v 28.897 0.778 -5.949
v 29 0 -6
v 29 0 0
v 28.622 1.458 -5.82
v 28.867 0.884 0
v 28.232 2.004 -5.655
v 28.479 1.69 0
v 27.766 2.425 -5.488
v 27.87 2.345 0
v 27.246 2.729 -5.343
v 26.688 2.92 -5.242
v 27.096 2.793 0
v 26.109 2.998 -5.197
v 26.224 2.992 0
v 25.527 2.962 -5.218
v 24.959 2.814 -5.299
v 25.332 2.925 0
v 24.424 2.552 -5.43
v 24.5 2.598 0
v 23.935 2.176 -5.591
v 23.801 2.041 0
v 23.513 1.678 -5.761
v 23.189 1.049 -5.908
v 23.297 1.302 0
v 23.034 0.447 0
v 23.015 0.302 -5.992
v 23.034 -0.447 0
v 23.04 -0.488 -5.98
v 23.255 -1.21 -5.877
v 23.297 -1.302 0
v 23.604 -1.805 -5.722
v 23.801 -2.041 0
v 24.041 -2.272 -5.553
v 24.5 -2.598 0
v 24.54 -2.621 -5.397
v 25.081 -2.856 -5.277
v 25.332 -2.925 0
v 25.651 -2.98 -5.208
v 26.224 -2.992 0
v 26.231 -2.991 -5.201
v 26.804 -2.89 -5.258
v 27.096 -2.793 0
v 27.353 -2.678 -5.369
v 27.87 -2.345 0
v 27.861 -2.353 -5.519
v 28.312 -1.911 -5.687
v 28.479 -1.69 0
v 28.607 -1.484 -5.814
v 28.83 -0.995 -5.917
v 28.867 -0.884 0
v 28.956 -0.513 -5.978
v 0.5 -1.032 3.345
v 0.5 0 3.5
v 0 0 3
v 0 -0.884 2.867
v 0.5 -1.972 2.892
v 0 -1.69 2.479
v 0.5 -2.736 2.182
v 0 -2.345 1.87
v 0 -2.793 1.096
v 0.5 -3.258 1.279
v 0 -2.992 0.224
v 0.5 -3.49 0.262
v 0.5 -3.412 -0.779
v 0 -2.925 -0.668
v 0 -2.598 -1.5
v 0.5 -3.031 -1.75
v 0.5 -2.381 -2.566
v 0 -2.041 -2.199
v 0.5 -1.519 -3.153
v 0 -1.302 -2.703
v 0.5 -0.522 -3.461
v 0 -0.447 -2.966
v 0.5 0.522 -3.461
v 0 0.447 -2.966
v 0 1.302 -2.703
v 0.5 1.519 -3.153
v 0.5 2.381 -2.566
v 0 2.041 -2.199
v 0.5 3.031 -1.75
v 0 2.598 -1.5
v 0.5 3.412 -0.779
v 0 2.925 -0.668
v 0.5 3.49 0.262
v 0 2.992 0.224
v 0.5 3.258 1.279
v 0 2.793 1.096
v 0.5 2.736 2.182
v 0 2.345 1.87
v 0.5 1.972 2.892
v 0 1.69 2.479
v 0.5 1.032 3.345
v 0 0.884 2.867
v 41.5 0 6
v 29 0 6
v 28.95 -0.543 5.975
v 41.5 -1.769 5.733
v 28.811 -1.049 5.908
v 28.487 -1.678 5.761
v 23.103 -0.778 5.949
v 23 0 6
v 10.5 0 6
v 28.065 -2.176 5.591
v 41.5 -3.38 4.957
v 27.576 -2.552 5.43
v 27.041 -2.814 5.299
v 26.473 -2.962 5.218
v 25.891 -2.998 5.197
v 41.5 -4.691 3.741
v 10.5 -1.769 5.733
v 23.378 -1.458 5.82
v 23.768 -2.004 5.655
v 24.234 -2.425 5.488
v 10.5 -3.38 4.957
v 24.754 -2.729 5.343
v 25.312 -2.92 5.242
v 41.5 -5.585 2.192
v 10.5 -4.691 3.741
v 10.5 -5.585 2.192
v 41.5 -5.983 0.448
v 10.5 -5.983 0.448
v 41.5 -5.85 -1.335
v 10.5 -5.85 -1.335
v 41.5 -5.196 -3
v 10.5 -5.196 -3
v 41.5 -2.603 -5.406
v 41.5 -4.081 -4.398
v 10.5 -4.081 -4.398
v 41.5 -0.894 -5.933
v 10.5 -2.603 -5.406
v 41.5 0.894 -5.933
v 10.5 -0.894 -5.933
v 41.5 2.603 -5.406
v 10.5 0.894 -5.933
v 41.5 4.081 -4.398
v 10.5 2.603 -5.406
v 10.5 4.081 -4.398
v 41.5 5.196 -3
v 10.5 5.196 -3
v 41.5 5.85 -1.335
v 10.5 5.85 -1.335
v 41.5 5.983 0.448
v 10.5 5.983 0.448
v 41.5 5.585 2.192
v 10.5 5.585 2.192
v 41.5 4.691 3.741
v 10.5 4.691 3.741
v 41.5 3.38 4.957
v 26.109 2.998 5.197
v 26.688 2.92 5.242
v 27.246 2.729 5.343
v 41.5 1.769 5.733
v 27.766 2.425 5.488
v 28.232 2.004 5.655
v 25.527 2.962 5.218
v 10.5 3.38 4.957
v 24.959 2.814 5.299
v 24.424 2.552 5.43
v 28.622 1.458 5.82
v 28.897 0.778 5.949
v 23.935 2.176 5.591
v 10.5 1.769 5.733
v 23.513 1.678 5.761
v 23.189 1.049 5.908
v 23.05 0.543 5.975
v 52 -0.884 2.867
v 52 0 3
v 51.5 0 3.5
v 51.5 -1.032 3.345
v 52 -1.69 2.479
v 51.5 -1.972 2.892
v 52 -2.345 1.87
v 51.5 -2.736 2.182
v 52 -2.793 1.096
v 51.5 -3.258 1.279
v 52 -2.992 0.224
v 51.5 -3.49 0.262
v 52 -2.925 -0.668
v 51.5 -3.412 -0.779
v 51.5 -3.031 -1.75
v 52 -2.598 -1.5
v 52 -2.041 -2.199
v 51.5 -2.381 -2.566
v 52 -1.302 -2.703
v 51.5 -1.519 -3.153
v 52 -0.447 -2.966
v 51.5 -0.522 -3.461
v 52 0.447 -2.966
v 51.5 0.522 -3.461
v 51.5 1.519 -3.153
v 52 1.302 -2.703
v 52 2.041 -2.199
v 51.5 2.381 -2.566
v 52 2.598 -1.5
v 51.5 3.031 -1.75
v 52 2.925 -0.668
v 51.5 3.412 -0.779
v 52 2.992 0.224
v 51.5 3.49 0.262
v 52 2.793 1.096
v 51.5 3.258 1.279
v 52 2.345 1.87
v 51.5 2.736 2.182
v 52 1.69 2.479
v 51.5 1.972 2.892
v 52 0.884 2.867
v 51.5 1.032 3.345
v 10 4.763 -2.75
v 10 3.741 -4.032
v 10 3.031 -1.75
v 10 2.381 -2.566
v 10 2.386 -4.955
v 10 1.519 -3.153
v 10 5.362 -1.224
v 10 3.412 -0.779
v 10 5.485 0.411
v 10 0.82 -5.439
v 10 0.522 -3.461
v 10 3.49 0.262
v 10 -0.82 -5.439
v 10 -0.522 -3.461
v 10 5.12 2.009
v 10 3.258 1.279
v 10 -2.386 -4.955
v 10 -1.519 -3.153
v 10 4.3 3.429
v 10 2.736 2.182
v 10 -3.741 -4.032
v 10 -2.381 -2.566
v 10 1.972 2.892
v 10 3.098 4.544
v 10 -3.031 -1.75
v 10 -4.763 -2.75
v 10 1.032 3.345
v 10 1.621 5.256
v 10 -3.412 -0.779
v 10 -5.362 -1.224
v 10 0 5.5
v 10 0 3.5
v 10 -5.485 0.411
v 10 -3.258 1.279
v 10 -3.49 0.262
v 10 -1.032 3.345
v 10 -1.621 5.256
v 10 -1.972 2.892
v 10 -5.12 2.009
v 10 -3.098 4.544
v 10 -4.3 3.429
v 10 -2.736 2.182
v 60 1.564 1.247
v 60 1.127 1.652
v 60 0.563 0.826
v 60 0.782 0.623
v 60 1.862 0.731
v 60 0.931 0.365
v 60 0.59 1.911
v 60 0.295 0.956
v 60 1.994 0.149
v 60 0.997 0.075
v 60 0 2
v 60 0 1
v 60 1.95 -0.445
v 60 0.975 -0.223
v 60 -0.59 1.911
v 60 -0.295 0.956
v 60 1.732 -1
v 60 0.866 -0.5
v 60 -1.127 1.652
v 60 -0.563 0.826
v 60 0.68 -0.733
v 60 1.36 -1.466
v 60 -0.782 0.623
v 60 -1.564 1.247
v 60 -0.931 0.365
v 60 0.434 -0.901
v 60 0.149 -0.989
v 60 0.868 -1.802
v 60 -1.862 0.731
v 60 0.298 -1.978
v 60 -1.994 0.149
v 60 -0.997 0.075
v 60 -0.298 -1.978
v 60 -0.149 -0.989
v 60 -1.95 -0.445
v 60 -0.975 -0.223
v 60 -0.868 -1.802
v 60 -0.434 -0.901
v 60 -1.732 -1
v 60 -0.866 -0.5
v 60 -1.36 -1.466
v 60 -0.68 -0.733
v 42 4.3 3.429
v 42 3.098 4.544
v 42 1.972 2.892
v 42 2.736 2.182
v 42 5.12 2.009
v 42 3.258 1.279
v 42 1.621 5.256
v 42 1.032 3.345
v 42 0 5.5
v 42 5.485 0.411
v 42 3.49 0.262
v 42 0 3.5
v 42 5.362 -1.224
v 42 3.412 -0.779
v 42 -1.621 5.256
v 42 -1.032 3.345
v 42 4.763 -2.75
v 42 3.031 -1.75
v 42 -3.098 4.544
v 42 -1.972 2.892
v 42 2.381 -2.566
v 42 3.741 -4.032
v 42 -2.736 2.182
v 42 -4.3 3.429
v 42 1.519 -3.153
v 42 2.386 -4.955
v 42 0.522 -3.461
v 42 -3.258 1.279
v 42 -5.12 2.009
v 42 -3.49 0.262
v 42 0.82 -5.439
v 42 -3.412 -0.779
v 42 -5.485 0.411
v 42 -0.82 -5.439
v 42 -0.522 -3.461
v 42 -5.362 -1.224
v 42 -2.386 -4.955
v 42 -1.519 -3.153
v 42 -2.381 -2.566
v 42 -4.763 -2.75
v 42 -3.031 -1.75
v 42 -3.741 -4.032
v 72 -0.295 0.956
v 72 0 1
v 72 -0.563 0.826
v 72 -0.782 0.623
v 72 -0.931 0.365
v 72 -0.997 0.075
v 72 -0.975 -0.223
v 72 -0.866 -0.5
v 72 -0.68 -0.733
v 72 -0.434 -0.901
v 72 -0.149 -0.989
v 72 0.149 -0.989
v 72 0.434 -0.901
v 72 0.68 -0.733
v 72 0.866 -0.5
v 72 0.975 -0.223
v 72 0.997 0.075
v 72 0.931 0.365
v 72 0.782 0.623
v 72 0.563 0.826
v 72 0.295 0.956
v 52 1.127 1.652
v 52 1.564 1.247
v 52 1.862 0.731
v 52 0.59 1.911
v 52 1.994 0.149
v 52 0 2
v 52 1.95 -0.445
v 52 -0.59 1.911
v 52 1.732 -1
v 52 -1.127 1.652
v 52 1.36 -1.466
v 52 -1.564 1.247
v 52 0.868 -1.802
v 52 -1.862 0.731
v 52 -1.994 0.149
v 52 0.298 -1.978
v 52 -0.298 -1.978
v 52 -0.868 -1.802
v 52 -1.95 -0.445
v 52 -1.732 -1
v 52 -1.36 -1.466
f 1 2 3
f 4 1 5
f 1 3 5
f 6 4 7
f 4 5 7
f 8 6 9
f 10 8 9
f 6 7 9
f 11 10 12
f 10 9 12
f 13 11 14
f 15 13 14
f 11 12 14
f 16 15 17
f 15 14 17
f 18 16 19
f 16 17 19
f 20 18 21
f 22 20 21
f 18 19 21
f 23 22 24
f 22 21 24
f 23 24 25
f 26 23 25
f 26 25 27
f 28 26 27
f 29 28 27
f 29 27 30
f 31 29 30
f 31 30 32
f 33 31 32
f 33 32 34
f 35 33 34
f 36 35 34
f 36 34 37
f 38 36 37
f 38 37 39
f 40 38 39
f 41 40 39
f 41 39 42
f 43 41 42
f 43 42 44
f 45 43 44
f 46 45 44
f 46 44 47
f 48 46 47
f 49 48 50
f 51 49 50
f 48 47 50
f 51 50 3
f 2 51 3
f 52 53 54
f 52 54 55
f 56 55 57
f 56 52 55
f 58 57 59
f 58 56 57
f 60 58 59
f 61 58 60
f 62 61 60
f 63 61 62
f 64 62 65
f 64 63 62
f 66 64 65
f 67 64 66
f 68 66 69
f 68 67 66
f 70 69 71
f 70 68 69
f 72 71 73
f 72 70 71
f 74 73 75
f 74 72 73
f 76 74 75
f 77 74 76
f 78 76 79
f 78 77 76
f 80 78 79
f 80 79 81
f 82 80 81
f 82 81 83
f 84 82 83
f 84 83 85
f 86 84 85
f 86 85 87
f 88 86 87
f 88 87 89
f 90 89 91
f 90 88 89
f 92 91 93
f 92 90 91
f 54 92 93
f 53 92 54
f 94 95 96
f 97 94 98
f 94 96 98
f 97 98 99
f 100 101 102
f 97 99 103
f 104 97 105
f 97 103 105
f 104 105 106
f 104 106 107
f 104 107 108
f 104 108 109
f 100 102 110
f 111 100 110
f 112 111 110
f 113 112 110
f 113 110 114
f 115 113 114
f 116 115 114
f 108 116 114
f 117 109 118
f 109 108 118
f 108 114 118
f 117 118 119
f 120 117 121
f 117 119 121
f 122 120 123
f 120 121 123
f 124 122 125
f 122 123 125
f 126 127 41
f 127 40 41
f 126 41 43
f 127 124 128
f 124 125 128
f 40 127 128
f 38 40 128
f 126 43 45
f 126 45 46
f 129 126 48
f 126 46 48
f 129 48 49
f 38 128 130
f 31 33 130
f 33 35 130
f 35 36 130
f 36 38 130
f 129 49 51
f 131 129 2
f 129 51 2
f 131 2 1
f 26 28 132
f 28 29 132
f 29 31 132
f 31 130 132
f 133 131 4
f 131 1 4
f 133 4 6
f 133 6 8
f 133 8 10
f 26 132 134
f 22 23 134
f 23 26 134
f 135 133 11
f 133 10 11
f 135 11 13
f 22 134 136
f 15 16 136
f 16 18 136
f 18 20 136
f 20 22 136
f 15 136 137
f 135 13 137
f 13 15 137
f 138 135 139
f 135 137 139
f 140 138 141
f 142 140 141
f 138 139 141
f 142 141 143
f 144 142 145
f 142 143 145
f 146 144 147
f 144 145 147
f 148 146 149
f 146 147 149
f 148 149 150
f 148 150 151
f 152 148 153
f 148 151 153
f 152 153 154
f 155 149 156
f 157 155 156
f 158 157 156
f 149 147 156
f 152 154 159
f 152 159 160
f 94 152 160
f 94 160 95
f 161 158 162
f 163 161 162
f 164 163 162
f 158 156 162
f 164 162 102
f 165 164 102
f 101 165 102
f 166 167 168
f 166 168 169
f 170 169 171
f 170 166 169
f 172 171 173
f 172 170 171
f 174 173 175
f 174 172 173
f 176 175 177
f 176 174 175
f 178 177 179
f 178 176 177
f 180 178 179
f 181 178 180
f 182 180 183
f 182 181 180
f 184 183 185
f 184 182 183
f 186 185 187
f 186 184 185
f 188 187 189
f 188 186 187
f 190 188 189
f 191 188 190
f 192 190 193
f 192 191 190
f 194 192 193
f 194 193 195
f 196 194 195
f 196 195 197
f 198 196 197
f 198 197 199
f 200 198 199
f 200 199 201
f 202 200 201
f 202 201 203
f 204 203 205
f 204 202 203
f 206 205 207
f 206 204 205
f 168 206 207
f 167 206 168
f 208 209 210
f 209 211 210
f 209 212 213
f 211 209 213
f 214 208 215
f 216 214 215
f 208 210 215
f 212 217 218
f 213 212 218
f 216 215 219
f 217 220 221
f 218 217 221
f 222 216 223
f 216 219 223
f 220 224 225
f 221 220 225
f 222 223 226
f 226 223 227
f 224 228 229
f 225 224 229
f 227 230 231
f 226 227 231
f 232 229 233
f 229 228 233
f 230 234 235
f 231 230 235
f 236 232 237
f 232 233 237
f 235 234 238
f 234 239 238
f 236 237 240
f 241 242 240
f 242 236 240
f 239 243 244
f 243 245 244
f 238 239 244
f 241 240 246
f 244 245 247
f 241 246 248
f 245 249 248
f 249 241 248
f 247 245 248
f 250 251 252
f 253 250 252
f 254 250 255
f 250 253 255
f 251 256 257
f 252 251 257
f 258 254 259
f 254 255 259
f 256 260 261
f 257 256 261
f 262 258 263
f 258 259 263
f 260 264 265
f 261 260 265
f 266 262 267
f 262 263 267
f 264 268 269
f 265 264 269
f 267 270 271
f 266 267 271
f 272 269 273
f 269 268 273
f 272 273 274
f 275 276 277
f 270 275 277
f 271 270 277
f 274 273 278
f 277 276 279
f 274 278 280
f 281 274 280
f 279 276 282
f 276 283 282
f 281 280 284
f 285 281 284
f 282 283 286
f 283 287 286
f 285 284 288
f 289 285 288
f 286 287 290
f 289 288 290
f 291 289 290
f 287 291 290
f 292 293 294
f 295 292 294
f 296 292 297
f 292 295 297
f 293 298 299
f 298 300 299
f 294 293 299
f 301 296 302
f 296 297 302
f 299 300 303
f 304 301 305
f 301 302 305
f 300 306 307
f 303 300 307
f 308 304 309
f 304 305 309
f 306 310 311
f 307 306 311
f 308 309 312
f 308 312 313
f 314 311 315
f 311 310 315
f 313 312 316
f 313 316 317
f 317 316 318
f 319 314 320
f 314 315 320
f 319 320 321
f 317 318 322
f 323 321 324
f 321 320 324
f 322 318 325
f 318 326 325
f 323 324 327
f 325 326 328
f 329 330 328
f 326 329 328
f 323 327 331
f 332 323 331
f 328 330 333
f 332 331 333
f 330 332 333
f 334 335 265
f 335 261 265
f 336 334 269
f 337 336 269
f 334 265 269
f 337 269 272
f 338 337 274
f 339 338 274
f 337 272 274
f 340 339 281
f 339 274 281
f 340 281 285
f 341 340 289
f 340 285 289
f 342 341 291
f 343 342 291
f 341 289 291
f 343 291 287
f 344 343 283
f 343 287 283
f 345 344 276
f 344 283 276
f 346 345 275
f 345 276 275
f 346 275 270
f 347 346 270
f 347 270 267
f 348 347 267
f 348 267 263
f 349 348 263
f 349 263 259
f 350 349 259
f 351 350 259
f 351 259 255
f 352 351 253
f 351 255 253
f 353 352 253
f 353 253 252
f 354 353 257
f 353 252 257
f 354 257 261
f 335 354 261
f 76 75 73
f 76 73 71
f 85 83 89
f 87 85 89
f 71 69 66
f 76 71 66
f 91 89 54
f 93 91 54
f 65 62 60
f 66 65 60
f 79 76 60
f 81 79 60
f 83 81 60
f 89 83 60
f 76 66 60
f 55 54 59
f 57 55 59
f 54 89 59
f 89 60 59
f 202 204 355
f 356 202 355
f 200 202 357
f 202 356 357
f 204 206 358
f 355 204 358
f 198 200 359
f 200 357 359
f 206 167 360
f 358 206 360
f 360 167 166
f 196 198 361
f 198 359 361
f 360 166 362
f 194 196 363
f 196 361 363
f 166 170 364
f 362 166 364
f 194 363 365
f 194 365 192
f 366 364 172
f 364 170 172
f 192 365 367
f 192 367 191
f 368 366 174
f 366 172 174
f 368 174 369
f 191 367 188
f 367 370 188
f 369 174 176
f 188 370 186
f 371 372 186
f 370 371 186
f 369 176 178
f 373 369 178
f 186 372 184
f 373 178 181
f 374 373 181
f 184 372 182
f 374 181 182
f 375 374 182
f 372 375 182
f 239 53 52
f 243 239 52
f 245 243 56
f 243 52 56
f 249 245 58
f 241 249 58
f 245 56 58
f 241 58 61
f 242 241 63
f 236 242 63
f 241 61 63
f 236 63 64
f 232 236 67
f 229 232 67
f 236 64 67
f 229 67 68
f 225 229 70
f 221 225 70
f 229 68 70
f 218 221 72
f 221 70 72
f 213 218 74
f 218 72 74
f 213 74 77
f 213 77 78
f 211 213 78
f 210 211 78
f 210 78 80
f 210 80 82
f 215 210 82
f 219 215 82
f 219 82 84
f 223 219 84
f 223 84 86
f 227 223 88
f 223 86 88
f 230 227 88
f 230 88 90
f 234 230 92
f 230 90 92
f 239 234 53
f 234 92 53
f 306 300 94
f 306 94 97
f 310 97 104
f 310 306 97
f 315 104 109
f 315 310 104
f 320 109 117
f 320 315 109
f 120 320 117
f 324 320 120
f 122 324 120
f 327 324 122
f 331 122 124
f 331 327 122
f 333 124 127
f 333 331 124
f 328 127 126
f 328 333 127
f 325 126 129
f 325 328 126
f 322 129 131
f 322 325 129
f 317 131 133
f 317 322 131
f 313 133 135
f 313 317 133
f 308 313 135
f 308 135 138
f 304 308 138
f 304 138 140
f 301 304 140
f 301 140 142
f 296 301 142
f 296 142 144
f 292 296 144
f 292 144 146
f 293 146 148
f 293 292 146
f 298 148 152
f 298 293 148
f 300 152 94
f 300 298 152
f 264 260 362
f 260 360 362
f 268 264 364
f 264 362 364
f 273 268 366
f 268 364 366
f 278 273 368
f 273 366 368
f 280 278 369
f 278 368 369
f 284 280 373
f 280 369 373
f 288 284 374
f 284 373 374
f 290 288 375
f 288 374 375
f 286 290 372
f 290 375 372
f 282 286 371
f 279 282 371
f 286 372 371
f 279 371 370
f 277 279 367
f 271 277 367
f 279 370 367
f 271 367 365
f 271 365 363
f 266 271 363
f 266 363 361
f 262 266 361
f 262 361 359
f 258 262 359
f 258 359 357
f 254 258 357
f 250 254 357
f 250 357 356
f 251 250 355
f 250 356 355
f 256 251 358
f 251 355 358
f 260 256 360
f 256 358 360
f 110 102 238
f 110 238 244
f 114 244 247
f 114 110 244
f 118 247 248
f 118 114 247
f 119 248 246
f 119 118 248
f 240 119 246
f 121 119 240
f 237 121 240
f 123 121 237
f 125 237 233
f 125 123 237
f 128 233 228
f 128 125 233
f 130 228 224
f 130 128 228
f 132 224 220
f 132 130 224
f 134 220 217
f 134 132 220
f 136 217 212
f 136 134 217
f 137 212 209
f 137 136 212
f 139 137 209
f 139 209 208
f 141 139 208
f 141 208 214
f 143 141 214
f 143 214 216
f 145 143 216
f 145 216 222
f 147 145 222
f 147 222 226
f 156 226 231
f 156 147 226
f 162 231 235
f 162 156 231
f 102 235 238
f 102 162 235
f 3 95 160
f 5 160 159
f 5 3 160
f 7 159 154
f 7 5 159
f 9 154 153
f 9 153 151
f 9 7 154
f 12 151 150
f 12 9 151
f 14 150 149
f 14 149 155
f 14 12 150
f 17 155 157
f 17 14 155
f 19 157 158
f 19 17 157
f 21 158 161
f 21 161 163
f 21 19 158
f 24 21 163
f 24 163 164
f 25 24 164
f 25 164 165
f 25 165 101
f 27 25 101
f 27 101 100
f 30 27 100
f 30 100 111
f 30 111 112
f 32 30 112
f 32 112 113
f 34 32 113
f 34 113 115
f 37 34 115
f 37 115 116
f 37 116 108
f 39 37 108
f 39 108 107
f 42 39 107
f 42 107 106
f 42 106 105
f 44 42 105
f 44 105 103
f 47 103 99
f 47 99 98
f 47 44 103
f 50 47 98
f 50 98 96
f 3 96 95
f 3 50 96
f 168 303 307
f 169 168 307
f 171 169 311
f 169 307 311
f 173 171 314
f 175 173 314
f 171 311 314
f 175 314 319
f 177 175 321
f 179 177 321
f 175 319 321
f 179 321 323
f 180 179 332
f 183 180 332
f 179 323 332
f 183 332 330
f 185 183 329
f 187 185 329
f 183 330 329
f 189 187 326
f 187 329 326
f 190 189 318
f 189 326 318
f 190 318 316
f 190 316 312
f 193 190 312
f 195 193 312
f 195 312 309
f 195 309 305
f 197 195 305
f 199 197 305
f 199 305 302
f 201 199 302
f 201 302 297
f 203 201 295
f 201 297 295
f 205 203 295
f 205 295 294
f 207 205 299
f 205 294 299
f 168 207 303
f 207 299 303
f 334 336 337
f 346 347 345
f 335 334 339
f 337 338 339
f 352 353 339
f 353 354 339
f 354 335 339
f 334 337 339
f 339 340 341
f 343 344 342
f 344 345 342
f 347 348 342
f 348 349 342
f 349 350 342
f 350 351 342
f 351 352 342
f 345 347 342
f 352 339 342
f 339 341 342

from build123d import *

# Parameters (mm, degrees)
F2_R          = 3
F3_DEPTH      = 6.001
F3_DEPTH_BACK = 6.001
F4_SIZE       = 0.5


with BuildPart() as f1:
    # F0 (on Front) → F1 (revolve)
    with BuildSketch(Plane.XZ):
        Polygon((0, 3.5), (0, 0), (72, 0), (72, 1), (60, 1), (60, 2), (52, 2), (52, 3.5), (42, 3.5), (42, 6), (10, 6), (10, 3.5), align=None)
    revolve(axis=Axis((37.3597331345, 0, 0), (1, 0, 0)))

    # F2 (on Top) → F3 (cut, two sides)
    with BuildSketch(Plane.XY) as f3_sk:
        with Locations((26, 0)):
            Circle(F2_R)
    extrude(amount=-F3_DEPTH, mode=Mode.SUBTRACT)
    extrude(f3_sk.sketch, amount=F3_DEPTH_BACK, mode=Mode.SUBTRACT)

    # F4
    f4_edges = [f1.edges().sort_by_distance(p)[0] for p in [
        (52, 0, -3.5),
        (0, 0, -3.5),
        (10, 0, -6),
        (42, 0, -6),
    ]]
    chamfer(f4_edges, length=F4_SIZE)


solid = f1.part
